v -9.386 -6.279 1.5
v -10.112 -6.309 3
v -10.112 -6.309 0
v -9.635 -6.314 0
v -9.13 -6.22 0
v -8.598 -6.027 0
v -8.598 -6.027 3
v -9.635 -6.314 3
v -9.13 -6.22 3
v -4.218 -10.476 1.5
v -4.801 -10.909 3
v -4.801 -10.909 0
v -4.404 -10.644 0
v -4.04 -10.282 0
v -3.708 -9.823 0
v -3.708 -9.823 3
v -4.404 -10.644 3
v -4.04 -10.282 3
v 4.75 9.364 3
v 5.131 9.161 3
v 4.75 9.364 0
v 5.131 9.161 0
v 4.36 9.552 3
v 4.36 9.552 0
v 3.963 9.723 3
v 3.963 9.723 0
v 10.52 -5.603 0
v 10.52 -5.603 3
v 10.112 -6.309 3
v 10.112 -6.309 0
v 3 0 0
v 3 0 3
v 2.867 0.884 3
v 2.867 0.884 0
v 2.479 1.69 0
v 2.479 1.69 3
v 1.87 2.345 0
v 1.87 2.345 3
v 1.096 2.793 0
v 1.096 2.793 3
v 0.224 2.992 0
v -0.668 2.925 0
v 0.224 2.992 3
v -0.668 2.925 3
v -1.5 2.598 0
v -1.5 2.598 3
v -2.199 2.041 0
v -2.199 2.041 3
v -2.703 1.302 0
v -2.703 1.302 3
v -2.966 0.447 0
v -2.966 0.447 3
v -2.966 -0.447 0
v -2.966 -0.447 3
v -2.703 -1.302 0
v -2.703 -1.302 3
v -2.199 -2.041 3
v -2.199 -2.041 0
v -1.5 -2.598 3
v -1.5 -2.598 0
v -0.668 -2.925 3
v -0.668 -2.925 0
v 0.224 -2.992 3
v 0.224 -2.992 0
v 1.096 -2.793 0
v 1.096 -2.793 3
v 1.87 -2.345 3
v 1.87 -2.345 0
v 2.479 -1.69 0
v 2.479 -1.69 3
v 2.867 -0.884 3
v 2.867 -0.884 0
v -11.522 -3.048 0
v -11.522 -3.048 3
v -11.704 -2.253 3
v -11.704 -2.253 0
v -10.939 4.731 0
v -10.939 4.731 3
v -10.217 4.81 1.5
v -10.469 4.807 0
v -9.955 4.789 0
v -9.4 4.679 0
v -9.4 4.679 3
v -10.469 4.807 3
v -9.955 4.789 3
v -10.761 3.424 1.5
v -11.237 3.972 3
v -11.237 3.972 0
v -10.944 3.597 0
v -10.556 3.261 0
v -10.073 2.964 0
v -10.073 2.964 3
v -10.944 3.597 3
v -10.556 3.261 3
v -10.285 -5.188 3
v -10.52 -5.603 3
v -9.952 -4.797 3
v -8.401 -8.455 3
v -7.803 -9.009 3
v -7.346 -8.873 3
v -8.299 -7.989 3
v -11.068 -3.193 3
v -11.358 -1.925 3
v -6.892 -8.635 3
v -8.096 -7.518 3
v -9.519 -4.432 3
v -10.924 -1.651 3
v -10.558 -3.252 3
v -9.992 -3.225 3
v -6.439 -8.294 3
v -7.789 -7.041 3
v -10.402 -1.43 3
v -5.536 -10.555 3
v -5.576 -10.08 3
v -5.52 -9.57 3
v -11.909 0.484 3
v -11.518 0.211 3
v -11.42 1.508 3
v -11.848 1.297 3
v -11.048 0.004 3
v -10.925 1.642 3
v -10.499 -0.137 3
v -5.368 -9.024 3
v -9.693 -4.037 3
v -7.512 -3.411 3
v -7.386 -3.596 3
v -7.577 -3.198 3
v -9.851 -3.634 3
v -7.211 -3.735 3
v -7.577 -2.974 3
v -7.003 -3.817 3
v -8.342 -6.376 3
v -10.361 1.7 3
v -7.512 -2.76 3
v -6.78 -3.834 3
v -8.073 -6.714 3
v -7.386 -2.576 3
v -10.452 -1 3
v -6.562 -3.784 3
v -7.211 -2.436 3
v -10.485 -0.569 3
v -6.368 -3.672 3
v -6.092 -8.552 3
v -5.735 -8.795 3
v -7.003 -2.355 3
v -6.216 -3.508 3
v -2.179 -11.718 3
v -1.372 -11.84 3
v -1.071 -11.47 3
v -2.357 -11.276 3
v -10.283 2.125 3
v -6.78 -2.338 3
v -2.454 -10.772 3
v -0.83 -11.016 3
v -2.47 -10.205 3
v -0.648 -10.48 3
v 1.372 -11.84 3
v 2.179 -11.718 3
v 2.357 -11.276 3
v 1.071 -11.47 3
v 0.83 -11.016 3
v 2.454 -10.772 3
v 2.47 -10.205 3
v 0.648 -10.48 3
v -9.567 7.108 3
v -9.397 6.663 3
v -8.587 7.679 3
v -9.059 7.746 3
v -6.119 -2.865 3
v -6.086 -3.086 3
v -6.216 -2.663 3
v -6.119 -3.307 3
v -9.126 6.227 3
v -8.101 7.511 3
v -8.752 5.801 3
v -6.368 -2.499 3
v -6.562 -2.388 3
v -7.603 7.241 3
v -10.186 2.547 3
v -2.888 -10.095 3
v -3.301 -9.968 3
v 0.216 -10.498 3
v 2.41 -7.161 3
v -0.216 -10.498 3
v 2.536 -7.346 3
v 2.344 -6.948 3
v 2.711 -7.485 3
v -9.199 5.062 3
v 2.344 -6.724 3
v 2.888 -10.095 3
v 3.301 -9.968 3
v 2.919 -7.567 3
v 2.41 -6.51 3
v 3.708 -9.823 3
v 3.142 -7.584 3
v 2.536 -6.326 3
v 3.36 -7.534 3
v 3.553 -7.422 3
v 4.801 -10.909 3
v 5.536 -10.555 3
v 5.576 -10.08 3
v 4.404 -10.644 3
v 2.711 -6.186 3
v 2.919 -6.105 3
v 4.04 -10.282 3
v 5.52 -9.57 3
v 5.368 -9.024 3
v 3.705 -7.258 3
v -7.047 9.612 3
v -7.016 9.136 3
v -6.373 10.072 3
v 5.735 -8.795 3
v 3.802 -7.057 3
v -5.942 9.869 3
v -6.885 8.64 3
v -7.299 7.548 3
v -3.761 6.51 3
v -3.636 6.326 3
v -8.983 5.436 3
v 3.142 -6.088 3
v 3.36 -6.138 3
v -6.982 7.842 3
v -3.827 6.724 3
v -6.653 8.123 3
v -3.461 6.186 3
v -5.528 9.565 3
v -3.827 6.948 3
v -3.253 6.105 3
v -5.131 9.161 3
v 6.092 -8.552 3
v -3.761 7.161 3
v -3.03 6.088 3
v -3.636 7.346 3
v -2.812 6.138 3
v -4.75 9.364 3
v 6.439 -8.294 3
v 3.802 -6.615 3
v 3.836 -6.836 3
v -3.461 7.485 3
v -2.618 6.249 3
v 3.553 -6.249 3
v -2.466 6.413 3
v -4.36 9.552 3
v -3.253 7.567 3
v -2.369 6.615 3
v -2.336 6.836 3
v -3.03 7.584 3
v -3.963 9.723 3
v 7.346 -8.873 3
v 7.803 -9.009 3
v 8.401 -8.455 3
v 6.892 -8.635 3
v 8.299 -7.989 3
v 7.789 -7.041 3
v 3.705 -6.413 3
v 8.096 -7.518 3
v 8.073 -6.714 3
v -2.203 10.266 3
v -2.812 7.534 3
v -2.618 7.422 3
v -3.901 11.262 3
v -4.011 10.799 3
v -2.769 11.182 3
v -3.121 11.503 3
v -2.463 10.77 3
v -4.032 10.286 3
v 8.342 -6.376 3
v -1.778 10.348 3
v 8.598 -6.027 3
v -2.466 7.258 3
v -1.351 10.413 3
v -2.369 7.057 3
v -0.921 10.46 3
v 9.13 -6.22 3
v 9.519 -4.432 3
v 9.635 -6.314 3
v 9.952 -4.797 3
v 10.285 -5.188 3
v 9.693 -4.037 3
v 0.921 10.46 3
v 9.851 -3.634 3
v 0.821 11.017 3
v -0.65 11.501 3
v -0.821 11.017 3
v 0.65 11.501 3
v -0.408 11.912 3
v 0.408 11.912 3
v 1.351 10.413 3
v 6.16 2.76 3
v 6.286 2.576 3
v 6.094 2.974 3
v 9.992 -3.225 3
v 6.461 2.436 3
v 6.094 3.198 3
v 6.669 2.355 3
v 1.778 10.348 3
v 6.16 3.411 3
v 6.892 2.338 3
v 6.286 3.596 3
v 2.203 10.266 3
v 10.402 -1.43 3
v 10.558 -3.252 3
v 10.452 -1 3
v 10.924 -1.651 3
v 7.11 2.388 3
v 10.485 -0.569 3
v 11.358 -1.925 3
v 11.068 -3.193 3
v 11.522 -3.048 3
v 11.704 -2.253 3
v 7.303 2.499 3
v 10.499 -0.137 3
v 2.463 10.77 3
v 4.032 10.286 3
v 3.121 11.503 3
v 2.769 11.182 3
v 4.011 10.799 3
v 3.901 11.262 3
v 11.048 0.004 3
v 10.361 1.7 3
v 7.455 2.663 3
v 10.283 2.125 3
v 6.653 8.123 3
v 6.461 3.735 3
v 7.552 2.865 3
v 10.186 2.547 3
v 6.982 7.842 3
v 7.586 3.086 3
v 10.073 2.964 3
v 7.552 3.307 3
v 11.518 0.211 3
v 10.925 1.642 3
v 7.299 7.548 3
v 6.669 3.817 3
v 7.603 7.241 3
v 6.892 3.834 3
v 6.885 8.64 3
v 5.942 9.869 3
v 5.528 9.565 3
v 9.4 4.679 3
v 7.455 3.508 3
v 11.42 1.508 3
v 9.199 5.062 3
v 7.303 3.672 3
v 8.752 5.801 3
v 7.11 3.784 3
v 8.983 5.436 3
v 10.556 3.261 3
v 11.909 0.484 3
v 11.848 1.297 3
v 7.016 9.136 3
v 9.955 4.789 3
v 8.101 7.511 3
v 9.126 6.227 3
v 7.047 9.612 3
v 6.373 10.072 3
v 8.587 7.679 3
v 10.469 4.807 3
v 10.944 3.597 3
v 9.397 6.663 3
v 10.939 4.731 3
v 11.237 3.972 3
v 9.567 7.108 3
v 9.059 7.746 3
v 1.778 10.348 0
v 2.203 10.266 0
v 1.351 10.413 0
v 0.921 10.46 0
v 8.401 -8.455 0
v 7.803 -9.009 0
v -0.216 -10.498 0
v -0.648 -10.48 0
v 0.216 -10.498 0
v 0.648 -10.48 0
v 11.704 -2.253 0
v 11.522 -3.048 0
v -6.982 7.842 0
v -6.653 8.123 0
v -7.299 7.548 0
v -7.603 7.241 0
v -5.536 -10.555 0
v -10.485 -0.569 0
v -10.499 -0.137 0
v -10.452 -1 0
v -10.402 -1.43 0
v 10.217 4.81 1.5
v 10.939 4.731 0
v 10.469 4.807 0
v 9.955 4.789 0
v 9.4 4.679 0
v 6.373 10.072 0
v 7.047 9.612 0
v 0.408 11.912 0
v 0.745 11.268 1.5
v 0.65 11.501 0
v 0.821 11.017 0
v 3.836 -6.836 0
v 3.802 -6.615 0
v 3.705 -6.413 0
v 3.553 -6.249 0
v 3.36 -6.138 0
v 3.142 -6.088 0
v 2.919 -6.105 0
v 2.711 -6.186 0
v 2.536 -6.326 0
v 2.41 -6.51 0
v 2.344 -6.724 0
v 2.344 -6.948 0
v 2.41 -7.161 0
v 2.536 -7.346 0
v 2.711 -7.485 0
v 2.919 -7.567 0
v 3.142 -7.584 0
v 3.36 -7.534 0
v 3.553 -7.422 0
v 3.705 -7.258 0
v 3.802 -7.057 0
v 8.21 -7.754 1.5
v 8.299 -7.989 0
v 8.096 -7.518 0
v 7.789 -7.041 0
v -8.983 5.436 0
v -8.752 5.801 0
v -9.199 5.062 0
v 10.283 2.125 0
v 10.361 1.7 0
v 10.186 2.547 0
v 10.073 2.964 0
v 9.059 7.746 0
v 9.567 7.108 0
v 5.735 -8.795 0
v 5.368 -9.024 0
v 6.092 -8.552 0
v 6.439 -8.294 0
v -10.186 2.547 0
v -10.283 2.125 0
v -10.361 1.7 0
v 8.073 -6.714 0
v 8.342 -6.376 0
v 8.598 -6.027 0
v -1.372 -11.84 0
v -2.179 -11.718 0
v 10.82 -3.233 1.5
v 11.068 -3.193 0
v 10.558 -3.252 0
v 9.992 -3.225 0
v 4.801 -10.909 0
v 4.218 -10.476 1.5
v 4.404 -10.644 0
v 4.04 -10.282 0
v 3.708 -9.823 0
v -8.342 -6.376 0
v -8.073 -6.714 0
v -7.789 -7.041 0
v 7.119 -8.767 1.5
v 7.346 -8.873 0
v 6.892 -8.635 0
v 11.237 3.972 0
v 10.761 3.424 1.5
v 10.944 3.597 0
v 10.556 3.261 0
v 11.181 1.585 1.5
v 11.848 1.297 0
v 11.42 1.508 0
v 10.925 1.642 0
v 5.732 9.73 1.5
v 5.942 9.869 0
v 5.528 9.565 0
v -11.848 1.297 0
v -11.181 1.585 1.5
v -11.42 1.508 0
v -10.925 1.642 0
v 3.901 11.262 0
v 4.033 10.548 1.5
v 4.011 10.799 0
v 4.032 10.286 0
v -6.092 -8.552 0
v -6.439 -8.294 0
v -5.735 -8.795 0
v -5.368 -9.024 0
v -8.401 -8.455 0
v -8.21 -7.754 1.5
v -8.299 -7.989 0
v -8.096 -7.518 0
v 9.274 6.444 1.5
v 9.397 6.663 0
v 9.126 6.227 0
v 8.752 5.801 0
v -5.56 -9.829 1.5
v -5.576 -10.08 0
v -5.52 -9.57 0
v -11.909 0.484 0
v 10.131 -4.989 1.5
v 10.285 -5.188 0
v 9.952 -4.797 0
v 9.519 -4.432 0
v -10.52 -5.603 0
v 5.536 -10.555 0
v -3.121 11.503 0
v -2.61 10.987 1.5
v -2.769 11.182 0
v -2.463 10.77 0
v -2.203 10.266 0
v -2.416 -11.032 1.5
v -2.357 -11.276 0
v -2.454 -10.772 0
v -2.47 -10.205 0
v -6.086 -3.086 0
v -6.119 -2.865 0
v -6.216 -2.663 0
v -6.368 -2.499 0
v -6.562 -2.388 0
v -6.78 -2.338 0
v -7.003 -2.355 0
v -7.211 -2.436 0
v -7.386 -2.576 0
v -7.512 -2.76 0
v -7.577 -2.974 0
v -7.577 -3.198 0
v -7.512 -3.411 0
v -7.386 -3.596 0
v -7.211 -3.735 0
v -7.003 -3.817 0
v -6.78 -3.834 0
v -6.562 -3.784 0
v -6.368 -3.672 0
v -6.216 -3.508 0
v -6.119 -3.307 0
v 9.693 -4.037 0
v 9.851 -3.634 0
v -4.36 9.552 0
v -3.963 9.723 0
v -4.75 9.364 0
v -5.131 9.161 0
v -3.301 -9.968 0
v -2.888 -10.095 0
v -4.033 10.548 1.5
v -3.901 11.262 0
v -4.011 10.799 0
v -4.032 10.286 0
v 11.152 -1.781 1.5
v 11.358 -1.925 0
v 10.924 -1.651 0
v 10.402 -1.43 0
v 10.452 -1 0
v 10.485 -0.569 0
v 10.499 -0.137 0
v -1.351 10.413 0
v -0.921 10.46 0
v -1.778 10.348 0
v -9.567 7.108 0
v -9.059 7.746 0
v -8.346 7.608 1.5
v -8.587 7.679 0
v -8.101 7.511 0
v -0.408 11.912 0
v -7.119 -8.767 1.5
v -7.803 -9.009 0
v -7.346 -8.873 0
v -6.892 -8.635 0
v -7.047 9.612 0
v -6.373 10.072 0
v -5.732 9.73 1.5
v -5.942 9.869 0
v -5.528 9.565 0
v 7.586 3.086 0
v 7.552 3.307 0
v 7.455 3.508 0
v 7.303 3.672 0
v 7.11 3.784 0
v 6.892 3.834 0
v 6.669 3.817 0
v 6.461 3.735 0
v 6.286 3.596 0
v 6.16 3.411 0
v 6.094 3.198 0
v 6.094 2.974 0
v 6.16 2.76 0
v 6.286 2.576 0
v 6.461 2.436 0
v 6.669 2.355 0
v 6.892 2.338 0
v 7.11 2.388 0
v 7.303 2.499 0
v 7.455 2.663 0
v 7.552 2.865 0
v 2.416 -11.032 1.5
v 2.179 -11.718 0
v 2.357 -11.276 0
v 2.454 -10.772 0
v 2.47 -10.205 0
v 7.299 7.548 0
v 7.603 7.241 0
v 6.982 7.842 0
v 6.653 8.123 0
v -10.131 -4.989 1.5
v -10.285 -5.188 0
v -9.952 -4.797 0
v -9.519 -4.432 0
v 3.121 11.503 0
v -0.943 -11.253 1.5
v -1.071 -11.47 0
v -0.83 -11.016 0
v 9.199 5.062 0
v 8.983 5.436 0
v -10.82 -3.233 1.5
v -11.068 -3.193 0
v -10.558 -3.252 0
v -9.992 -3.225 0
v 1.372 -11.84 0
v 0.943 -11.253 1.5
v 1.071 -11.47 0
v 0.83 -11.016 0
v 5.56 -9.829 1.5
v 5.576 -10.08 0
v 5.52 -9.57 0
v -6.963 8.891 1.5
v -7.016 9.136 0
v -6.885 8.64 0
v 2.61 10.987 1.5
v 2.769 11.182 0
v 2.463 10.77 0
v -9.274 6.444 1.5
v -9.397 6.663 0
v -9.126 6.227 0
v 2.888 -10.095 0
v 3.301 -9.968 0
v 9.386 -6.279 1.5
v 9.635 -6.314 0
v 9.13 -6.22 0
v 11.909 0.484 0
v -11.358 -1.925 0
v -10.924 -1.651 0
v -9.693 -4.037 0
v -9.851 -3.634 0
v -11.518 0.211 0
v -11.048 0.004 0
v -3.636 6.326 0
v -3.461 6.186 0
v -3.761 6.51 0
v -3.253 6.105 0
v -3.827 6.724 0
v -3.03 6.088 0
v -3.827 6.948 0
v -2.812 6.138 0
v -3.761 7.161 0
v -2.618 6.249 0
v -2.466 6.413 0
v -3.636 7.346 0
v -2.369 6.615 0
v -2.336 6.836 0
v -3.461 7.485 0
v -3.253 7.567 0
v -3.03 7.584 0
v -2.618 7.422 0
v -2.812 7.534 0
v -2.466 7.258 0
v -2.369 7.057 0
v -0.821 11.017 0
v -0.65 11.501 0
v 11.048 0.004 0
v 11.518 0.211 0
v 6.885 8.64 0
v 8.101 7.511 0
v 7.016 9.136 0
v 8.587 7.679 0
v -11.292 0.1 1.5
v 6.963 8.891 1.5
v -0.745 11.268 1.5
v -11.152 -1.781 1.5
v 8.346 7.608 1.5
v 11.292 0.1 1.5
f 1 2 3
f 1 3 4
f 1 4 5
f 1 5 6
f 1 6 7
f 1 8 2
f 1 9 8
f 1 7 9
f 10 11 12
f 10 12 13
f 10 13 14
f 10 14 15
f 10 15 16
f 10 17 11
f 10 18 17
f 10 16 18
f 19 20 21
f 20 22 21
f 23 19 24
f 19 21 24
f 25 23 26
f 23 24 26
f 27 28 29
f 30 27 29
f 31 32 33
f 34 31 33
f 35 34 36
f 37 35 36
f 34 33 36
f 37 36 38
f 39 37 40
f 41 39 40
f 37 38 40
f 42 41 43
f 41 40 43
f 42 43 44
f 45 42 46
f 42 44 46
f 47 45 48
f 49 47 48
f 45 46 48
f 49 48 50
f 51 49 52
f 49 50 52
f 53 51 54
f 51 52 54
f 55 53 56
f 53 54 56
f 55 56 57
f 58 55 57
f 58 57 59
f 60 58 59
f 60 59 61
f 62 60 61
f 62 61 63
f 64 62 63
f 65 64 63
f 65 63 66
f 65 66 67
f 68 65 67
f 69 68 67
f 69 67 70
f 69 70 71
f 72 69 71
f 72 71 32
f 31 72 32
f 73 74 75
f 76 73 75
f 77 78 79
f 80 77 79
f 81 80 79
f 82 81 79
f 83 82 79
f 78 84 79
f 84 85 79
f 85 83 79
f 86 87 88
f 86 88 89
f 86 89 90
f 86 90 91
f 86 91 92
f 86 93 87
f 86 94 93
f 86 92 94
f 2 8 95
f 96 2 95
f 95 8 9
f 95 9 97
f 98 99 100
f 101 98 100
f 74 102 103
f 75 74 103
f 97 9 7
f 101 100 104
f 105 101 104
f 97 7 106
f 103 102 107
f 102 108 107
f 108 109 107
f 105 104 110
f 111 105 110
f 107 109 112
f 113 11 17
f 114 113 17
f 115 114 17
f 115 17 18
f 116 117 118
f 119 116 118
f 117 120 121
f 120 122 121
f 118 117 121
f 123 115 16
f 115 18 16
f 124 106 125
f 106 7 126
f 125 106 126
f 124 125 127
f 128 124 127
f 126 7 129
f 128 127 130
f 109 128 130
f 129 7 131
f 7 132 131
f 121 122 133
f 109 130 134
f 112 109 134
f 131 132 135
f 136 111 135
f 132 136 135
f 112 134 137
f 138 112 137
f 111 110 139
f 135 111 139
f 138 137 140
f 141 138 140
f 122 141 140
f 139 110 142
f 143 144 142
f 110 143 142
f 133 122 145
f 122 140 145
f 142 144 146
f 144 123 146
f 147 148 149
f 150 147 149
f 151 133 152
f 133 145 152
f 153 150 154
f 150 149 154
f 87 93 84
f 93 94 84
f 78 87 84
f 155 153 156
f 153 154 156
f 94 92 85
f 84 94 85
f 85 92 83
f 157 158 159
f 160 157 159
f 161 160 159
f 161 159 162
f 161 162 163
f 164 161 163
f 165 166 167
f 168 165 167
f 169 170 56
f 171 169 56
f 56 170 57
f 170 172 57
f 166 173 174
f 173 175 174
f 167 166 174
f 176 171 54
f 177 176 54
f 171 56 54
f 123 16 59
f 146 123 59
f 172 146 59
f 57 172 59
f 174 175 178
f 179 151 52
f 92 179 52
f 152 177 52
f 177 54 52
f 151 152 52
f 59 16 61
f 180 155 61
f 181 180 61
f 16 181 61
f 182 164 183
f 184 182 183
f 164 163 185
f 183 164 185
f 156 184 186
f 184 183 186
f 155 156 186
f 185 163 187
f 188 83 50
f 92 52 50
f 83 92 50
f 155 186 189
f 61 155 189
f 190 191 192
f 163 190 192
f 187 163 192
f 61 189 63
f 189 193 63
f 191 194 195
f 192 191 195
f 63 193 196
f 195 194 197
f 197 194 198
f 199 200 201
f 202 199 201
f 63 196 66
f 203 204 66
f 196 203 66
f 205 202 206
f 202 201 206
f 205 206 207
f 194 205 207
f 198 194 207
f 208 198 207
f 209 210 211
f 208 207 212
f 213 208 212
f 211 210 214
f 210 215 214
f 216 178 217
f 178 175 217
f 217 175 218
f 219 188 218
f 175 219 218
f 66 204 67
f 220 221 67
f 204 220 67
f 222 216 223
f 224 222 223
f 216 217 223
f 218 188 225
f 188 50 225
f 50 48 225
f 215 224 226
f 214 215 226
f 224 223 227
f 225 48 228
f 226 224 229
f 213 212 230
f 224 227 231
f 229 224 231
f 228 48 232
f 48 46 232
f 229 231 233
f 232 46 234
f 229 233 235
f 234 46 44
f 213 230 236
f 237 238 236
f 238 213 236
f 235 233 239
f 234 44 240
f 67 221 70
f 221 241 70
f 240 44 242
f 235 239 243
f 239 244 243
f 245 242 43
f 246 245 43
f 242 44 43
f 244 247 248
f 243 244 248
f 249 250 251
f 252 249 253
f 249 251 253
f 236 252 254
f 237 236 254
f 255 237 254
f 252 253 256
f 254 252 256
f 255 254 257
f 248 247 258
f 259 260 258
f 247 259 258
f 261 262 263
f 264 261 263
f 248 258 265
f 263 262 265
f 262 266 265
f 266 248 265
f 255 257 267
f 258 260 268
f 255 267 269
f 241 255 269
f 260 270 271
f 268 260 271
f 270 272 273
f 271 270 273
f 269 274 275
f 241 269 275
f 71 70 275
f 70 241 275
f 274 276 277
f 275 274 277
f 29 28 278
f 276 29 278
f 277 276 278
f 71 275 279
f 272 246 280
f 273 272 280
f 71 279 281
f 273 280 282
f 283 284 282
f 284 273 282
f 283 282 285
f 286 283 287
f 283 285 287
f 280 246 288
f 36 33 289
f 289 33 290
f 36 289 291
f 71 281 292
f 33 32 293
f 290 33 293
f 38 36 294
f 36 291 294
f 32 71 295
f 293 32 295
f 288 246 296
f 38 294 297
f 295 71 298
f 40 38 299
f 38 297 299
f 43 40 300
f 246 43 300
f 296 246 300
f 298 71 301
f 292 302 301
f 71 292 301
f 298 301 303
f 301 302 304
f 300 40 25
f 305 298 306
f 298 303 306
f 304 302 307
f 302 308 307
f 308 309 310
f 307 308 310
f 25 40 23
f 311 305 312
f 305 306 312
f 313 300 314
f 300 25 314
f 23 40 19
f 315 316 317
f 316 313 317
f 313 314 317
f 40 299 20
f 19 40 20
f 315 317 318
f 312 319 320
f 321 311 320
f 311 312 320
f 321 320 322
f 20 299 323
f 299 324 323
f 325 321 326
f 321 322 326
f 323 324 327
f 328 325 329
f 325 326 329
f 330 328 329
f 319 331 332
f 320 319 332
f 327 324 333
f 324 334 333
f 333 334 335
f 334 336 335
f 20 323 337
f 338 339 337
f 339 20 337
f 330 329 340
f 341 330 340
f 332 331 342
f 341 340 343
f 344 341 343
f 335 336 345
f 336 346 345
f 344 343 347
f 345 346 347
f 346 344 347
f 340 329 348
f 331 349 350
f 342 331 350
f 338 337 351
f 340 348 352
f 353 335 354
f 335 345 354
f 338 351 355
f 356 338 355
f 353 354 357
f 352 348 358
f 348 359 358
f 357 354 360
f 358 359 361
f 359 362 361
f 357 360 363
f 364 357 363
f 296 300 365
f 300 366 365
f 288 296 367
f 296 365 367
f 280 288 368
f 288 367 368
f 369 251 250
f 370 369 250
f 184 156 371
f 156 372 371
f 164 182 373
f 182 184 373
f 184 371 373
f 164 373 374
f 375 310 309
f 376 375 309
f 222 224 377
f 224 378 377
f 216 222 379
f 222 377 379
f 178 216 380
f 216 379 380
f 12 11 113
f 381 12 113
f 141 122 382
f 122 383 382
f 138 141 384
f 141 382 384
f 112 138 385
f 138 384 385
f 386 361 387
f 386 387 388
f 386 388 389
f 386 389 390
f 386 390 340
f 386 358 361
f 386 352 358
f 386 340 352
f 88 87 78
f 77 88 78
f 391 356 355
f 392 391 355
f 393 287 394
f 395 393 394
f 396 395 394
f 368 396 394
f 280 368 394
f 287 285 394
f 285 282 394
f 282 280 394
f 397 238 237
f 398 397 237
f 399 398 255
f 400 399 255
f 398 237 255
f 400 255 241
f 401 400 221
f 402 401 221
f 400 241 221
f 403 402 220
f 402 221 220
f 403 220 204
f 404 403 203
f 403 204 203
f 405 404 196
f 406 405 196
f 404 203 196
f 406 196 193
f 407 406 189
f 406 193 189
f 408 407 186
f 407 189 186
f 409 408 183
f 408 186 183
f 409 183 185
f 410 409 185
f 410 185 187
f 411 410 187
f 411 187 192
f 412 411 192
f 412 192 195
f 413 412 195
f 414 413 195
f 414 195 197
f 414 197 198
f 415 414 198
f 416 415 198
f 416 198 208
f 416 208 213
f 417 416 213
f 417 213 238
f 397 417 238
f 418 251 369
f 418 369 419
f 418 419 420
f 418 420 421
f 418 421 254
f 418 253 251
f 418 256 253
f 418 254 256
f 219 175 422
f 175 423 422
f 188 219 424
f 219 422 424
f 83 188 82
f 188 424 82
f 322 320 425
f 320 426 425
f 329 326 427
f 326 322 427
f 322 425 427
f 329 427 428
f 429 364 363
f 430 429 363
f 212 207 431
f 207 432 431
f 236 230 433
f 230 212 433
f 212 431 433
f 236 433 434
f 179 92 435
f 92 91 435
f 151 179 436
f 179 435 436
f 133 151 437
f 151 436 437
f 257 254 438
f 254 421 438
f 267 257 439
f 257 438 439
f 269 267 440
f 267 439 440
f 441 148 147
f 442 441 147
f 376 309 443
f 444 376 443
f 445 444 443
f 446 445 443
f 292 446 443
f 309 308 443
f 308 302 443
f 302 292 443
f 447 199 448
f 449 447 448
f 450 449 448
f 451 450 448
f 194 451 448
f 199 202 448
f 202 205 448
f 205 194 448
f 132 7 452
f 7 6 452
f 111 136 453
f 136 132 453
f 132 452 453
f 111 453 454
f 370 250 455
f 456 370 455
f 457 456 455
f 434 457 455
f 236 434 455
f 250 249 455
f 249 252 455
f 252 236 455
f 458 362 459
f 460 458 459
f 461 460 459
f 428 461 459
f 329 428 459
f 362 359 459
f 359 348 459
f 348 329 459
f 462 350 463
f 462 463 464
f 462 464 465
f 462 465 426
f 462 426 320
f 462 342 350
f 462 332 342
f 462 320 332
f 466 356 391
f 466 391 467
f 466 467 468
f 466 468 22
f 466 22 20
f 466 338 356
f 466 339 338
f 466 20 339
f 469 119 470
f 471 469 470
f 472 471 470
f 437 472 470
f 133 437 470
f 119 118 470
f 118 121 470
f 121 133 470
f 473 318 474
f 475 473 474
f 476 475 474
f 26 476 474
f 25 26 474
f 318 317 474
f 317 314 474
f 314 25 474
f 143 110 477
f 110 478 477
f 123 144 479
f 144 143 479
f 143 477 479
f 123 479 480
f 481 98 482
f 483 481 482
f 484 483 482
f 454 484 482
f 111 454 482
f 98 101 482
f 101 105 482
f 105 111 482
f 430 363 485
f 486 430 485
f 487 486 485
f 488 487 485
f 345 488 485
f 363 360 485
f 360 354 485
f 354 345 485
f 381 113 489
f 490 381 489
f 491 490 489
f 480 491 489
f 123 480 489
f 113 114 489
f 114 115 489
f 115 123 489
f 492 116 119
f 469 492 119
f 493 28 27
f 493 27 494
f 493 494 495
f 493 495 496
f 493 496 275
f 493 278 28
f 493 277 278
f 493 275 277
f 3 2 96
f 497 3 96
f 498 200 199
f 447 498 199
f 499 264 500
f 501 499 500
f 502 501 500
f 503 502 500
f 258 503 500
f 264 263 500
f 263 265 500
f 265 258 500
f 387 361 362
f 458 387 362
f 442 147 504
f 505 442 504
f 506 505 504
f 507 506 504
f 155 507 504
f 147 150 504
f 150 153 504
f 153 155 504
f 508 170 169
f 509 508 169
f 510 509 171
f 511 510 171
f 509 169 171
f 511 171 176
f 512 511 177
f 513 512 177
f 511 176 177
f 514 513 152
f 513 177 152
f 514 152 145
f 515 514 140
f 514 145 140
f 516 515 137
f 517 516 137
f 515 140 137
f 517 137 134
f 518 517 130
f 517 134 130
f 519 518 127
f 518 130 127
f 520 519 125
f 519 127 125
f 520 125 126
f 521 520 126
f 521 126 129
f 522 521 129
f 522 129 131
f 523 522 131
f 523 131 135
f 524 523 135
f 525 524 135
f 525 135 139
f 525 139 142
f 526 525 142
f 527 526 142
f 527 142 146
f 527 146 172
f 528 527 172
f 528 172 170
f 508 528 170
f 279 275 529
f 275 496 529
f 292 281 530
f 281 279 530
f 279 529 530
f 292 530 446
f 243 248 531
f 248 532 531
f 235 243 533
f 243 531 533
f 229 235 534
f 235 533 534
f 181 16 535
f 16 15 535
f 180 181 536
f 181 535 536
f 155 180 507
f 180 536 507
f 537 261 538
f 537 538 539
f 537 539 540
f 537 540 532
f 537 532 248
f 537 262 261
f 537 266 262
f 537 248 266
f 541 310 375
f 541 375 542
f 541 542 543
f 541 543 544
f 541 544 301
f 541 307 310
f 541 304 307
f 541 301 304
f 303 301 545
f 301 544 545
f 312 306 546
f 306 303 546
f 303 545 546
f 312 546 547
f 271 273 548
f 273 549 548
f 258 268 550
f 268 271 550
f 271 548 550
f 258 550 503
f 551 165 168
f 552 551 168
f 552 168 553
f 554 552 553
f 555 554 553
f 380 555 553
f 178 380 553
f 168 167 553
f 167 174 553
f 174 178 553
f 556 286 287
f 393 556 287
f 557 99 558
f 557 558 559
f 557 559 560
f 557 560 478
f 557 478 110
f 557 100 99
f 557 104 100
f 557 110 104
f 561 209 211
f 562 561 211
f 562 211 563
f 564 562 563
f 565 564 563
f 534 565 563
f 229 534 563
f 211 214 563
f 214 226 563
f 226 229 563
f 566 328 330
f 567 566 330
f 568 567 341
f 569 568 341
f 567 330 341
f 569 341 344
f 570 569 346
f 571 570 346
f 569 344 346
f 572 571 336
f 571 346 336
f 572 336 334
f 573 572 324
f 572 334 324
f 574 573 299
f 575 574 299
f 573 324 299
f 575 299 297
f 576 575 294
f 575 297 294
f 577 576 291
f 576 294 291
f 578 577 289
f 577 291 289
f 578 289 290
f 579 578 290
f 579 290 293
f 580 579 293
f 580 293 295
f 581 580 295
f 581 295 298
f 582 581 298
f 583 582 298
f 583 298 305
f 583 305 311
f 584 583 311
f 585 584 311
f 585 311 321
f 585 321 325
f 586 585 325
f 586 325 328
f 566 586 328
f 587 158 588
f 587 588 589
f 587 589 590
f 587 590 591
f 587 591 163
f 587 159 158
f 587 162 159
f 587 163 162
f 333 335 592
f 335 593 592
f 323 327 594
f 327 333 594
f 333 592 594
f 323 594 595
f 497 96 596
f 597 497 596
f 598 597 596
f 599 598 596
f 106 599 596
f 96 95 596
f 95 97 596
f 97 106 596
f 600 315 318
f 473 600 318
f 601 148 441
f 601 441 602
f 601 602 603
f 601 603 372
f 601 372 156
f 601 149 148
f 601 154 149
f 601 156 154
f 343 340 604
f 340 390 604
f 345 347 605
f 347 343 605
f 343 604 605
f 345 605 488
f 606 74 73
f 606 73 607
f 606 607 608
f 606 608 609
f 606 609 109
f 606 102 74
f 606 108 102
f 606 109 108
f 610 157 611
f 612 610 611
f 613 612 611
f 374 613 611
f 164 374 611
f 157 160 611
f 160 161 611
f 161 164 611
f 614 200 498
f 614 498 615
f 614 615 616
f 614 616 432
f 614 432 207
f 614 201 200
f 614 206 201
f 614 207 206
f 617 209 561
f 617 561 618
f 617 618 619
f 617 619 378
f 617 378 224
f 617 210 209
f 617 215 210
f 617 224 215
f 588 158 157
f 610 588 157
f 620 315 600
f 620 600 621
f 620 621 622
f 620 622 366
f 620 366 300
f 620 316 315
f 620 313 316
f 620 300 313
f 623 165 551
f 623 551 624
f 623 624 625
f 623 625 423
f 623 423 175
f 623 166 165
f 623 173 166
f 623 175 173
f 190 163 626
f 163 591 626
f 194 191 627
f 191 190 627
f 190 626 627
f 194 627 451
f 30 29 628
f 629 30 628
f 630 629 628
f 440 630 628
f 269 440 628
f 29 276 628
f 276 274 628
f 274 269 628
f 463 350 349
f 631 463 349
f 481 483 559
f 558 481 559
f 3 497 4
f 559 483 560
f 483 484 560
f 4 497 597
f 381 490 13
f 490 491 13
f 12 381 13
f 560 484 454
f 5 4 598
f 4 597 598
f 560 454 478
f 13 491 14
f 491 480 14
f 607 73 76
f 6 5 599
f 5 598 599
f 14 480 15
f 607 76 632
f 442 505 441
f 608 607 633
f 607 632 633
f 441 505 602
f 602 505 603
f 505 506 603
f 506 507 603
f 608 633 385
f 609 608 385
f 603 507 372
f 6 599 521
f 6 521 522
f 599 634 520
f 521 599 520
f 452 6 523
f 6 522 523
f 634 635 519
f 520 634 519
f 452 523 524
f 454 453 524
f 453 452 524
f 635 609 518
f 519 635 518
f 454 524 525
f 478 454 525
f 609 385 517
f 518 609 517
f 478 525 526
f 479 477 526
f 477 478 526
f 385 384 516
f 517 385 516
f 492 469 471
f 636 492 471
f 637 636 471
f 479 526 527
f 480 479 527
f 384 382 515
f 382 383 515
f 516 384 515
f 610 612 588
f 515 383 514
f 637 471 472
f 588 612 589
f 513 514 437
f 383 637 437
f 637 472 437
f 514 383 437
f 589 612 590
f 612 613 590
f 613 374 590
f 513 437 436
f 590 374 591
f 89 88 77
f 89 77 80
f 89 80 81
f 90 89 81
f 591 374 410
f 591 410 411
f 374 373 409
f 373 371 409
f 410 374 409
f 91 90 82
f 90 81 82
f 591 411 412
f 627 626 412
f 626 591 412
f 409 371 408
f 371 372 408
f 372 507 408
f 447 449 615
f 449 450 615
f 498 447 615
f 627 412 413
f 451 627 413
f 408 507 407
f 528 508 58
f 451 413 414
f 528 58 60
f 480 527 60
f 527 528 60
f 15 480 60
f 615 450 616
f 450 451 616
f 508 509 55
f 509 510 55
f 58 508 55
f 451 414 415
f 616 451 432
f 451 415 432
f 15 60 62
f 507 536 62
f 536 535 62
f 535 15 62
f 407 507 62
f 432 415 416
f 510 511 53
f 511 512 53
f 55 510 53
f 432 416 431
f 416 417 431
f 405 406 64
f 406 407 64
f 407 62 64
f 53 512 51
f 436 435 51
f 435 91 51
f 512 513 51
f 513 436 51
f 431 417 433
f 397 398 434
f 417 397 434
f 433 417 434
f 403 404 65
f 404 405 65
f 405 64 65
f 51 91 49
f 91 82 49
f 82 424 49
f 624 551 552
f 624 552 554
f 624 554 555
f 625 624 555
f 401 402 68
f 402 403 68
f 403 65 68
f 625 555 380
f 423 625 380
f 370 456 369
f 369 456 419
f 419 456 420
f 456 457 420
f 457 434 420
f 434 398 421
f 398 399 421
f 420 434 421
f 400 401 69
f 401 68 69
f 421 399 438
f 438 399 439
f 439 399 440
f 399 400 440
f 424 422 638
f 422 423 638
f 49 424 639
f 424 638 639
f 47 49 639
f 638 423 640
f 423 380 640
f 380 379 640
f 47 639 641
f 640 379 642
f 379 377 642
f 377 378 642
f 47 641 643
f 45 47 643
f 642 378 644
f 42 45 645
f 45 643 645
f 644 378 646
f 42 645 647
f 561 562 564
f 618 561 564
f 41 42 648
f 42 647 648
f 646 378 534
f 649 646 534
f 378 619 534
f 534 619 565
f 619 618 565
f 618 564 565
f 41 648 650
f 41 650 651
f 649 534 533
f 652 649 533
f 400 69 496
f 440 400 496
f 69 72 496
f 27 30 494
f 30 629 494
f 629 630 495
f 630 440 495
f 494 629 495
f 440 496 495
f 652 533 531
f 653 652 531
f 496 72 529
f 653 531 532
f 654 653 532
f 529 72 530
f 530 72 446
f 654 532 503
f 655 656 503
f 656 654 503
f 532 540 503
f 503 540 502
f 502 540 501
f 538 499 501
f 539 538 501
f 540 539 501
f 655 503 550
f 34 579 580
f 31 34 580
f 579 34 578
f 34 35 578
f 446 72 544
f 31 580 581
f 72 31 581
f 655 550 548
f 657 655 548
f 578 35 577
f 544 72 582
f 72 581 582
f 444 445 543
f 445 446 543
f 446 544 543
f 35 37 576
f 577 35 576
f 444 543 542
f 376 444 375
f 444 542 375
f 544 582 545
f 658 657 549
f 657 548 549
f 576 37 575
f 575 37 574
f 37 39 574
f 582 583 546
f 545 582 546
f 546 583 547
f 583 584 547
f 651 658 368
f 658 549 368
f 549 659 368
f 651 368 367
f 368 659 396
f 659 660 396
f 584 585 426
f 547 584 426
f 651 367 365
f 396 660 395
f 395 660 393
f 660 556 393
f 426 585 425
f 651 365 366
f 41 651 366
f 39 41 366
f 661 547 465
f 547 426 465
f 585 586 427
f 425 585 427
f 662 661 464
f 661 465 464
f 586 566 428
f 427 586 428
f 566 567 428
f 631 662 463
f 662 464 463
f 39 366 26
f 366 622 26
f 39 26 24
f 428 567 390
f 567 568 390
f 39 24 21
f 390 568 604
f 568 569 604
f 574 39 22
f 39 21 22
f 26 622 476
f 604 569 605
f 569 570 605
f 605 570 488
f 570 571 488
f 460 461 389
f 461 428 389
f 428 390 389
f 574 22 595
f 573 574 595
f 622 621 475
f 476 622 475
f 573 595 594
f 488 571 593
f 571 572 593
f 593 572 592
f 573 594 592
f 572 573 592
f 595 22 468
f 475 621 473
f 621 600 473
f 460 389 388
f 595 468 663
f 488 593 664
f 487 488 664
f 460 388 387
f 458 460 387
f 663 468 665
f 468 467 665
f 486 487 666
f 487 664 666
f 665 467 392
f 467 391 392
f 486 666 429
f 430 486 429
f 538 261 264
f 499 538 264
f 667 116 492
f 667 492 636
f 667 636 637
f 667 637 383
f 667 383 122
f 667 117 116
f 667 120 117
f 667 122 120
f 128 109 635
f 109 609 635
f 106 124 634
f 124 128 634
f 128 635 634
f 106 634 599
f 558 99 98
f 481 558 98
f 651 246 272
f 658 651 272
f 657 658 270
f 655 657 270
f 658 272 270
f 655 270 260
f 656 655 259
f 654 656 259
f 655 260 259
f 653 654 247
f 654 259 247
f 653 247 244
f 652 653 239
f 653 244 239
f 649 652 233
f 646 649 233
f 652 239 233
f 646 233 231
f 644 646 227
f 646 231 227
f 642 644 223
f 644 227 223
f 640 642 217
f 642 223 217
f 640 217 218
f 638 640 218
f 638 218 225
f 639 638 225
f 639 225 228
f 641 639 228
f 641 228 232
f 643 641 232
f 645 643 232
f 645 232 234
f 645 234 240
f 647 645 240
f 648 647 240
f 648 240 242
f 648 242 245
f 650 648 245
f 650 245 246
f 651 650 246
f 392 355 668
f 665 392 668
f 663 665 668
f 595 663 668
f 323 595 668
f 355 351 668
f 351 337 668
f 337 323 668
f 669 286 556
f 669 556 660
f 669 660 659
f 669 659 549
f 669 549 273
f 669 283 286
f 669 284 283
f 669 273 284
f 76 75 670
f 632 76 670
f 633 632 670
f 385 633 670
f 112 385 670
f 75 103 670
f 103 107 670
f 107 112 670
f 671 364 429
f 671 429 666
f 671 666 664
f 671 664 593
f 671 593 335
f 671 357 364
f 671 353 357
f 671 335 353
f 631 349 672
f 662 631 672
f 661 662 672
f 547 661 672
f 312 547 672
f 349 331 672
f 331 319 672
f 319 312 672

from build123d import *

# Parameters (mm, degrees)
SKIZZE1_R                       = 10.5
AUFSATZ_LINEAR_AUSTRAGEN1_DEPTH = 3
AUFSATZ_LINEAR_AUSTRAGEN2_DEPTH = 3
KREISMUSTER1_COUNT              = 21
SKIZZE3_R                       = 0.75
SCHNITT_LINEAR_AUSTRAGEN1_DEPTH = 6.1
SKIZZE4_R                       = 3
SCHNITT_LINEAR_AUSTRAGEN2_DEPTH = 6.1


with BuildPart() as part:
    # Skizze1 → Aufsatz-Linear austragen1 (new body)
    with BuildSketch(Plane.XY):
        Circle(SKIZZE1_R)
    extrude(amount=AUFSATZ_LINEAR_AUSTRAGEN1_DEPTH)

    # Skizze2 → Aufsatz-Linear austragen2 (add)
    with BuildSketch(Plane.XY.offset(3)):
        with BuildLine():
            Line((0.920961993, 10.459532925), (-0.920961993, 10.459532925))
            add(Edge.make_bspline(
                [(-0.407740146, 11.911843377), (-0.824906562, 11.350994541), (-0.920961993, 10.459532925)],
                knots=[0, 0, 0, 1, 1, 1], degree=2))
            Line((-0.407740146, 11.911843377), (0.407740146, 11.911843377))
            add(Edge.make_bspline(
                [(0.407740146, 11.911843377), (0.824906562, 11.350994541), (0.920961993, 10.459532925)],
                knots=[0, 0, 0, 1, 1, 1], degree=2))
        make_face()
    aufsatz_linear_austragen2 = extrude(amount=-AUFSATZ_LINEAR_AUSTRAGEN2_DEPTH)

    # Kreismuster1: Aufsatz-Linear austragen2 ×21 about axis
    kreismuster1_axis = Axis((0, 0, 3), (0, 0, 1))
    for i in range(1, KREISMUSTER1_COUNT):
        add(aufsatz_linear_austragen2.rotate(kreismuster1_axis, i * 360 / KREISMUSTER1_COUNT))

    # Skizze3 → Schnitt-Linear austragen1 (cut)
    with BuildSketch(Plane.XY.offset(3)):
        with Locations((-3.085747028, 6.835800266)):
            Circle(SKIZZE3_R)
        with Locations((6.835800266, 3.085747028)):
            Circle(SKIZZE3_R)
        with Locations((-6.835800266, -3.085747028)):
            Circle(SKIZZE3_R)
        with Locations((3.085747028, -6.835800266)):
            Circle(SKIZZE3_R)
    extrude(amount=-SCHNITT_LINEAR_AUSTRAGEN1_DEPTH, mode=Mode.SUBTRACT)

    # Skizze4 → Schnitt-Linear austragen2 (cut)
    with BuildSketch(Plane.XY.offset(3)):
        Circle(SKIZZE4_R)
    extrude(amount=-SCHNITT_LINEAR_AUSTRAGEN2_DEPTH, mode=Mode.SUBTRACT)


solid = part.part
